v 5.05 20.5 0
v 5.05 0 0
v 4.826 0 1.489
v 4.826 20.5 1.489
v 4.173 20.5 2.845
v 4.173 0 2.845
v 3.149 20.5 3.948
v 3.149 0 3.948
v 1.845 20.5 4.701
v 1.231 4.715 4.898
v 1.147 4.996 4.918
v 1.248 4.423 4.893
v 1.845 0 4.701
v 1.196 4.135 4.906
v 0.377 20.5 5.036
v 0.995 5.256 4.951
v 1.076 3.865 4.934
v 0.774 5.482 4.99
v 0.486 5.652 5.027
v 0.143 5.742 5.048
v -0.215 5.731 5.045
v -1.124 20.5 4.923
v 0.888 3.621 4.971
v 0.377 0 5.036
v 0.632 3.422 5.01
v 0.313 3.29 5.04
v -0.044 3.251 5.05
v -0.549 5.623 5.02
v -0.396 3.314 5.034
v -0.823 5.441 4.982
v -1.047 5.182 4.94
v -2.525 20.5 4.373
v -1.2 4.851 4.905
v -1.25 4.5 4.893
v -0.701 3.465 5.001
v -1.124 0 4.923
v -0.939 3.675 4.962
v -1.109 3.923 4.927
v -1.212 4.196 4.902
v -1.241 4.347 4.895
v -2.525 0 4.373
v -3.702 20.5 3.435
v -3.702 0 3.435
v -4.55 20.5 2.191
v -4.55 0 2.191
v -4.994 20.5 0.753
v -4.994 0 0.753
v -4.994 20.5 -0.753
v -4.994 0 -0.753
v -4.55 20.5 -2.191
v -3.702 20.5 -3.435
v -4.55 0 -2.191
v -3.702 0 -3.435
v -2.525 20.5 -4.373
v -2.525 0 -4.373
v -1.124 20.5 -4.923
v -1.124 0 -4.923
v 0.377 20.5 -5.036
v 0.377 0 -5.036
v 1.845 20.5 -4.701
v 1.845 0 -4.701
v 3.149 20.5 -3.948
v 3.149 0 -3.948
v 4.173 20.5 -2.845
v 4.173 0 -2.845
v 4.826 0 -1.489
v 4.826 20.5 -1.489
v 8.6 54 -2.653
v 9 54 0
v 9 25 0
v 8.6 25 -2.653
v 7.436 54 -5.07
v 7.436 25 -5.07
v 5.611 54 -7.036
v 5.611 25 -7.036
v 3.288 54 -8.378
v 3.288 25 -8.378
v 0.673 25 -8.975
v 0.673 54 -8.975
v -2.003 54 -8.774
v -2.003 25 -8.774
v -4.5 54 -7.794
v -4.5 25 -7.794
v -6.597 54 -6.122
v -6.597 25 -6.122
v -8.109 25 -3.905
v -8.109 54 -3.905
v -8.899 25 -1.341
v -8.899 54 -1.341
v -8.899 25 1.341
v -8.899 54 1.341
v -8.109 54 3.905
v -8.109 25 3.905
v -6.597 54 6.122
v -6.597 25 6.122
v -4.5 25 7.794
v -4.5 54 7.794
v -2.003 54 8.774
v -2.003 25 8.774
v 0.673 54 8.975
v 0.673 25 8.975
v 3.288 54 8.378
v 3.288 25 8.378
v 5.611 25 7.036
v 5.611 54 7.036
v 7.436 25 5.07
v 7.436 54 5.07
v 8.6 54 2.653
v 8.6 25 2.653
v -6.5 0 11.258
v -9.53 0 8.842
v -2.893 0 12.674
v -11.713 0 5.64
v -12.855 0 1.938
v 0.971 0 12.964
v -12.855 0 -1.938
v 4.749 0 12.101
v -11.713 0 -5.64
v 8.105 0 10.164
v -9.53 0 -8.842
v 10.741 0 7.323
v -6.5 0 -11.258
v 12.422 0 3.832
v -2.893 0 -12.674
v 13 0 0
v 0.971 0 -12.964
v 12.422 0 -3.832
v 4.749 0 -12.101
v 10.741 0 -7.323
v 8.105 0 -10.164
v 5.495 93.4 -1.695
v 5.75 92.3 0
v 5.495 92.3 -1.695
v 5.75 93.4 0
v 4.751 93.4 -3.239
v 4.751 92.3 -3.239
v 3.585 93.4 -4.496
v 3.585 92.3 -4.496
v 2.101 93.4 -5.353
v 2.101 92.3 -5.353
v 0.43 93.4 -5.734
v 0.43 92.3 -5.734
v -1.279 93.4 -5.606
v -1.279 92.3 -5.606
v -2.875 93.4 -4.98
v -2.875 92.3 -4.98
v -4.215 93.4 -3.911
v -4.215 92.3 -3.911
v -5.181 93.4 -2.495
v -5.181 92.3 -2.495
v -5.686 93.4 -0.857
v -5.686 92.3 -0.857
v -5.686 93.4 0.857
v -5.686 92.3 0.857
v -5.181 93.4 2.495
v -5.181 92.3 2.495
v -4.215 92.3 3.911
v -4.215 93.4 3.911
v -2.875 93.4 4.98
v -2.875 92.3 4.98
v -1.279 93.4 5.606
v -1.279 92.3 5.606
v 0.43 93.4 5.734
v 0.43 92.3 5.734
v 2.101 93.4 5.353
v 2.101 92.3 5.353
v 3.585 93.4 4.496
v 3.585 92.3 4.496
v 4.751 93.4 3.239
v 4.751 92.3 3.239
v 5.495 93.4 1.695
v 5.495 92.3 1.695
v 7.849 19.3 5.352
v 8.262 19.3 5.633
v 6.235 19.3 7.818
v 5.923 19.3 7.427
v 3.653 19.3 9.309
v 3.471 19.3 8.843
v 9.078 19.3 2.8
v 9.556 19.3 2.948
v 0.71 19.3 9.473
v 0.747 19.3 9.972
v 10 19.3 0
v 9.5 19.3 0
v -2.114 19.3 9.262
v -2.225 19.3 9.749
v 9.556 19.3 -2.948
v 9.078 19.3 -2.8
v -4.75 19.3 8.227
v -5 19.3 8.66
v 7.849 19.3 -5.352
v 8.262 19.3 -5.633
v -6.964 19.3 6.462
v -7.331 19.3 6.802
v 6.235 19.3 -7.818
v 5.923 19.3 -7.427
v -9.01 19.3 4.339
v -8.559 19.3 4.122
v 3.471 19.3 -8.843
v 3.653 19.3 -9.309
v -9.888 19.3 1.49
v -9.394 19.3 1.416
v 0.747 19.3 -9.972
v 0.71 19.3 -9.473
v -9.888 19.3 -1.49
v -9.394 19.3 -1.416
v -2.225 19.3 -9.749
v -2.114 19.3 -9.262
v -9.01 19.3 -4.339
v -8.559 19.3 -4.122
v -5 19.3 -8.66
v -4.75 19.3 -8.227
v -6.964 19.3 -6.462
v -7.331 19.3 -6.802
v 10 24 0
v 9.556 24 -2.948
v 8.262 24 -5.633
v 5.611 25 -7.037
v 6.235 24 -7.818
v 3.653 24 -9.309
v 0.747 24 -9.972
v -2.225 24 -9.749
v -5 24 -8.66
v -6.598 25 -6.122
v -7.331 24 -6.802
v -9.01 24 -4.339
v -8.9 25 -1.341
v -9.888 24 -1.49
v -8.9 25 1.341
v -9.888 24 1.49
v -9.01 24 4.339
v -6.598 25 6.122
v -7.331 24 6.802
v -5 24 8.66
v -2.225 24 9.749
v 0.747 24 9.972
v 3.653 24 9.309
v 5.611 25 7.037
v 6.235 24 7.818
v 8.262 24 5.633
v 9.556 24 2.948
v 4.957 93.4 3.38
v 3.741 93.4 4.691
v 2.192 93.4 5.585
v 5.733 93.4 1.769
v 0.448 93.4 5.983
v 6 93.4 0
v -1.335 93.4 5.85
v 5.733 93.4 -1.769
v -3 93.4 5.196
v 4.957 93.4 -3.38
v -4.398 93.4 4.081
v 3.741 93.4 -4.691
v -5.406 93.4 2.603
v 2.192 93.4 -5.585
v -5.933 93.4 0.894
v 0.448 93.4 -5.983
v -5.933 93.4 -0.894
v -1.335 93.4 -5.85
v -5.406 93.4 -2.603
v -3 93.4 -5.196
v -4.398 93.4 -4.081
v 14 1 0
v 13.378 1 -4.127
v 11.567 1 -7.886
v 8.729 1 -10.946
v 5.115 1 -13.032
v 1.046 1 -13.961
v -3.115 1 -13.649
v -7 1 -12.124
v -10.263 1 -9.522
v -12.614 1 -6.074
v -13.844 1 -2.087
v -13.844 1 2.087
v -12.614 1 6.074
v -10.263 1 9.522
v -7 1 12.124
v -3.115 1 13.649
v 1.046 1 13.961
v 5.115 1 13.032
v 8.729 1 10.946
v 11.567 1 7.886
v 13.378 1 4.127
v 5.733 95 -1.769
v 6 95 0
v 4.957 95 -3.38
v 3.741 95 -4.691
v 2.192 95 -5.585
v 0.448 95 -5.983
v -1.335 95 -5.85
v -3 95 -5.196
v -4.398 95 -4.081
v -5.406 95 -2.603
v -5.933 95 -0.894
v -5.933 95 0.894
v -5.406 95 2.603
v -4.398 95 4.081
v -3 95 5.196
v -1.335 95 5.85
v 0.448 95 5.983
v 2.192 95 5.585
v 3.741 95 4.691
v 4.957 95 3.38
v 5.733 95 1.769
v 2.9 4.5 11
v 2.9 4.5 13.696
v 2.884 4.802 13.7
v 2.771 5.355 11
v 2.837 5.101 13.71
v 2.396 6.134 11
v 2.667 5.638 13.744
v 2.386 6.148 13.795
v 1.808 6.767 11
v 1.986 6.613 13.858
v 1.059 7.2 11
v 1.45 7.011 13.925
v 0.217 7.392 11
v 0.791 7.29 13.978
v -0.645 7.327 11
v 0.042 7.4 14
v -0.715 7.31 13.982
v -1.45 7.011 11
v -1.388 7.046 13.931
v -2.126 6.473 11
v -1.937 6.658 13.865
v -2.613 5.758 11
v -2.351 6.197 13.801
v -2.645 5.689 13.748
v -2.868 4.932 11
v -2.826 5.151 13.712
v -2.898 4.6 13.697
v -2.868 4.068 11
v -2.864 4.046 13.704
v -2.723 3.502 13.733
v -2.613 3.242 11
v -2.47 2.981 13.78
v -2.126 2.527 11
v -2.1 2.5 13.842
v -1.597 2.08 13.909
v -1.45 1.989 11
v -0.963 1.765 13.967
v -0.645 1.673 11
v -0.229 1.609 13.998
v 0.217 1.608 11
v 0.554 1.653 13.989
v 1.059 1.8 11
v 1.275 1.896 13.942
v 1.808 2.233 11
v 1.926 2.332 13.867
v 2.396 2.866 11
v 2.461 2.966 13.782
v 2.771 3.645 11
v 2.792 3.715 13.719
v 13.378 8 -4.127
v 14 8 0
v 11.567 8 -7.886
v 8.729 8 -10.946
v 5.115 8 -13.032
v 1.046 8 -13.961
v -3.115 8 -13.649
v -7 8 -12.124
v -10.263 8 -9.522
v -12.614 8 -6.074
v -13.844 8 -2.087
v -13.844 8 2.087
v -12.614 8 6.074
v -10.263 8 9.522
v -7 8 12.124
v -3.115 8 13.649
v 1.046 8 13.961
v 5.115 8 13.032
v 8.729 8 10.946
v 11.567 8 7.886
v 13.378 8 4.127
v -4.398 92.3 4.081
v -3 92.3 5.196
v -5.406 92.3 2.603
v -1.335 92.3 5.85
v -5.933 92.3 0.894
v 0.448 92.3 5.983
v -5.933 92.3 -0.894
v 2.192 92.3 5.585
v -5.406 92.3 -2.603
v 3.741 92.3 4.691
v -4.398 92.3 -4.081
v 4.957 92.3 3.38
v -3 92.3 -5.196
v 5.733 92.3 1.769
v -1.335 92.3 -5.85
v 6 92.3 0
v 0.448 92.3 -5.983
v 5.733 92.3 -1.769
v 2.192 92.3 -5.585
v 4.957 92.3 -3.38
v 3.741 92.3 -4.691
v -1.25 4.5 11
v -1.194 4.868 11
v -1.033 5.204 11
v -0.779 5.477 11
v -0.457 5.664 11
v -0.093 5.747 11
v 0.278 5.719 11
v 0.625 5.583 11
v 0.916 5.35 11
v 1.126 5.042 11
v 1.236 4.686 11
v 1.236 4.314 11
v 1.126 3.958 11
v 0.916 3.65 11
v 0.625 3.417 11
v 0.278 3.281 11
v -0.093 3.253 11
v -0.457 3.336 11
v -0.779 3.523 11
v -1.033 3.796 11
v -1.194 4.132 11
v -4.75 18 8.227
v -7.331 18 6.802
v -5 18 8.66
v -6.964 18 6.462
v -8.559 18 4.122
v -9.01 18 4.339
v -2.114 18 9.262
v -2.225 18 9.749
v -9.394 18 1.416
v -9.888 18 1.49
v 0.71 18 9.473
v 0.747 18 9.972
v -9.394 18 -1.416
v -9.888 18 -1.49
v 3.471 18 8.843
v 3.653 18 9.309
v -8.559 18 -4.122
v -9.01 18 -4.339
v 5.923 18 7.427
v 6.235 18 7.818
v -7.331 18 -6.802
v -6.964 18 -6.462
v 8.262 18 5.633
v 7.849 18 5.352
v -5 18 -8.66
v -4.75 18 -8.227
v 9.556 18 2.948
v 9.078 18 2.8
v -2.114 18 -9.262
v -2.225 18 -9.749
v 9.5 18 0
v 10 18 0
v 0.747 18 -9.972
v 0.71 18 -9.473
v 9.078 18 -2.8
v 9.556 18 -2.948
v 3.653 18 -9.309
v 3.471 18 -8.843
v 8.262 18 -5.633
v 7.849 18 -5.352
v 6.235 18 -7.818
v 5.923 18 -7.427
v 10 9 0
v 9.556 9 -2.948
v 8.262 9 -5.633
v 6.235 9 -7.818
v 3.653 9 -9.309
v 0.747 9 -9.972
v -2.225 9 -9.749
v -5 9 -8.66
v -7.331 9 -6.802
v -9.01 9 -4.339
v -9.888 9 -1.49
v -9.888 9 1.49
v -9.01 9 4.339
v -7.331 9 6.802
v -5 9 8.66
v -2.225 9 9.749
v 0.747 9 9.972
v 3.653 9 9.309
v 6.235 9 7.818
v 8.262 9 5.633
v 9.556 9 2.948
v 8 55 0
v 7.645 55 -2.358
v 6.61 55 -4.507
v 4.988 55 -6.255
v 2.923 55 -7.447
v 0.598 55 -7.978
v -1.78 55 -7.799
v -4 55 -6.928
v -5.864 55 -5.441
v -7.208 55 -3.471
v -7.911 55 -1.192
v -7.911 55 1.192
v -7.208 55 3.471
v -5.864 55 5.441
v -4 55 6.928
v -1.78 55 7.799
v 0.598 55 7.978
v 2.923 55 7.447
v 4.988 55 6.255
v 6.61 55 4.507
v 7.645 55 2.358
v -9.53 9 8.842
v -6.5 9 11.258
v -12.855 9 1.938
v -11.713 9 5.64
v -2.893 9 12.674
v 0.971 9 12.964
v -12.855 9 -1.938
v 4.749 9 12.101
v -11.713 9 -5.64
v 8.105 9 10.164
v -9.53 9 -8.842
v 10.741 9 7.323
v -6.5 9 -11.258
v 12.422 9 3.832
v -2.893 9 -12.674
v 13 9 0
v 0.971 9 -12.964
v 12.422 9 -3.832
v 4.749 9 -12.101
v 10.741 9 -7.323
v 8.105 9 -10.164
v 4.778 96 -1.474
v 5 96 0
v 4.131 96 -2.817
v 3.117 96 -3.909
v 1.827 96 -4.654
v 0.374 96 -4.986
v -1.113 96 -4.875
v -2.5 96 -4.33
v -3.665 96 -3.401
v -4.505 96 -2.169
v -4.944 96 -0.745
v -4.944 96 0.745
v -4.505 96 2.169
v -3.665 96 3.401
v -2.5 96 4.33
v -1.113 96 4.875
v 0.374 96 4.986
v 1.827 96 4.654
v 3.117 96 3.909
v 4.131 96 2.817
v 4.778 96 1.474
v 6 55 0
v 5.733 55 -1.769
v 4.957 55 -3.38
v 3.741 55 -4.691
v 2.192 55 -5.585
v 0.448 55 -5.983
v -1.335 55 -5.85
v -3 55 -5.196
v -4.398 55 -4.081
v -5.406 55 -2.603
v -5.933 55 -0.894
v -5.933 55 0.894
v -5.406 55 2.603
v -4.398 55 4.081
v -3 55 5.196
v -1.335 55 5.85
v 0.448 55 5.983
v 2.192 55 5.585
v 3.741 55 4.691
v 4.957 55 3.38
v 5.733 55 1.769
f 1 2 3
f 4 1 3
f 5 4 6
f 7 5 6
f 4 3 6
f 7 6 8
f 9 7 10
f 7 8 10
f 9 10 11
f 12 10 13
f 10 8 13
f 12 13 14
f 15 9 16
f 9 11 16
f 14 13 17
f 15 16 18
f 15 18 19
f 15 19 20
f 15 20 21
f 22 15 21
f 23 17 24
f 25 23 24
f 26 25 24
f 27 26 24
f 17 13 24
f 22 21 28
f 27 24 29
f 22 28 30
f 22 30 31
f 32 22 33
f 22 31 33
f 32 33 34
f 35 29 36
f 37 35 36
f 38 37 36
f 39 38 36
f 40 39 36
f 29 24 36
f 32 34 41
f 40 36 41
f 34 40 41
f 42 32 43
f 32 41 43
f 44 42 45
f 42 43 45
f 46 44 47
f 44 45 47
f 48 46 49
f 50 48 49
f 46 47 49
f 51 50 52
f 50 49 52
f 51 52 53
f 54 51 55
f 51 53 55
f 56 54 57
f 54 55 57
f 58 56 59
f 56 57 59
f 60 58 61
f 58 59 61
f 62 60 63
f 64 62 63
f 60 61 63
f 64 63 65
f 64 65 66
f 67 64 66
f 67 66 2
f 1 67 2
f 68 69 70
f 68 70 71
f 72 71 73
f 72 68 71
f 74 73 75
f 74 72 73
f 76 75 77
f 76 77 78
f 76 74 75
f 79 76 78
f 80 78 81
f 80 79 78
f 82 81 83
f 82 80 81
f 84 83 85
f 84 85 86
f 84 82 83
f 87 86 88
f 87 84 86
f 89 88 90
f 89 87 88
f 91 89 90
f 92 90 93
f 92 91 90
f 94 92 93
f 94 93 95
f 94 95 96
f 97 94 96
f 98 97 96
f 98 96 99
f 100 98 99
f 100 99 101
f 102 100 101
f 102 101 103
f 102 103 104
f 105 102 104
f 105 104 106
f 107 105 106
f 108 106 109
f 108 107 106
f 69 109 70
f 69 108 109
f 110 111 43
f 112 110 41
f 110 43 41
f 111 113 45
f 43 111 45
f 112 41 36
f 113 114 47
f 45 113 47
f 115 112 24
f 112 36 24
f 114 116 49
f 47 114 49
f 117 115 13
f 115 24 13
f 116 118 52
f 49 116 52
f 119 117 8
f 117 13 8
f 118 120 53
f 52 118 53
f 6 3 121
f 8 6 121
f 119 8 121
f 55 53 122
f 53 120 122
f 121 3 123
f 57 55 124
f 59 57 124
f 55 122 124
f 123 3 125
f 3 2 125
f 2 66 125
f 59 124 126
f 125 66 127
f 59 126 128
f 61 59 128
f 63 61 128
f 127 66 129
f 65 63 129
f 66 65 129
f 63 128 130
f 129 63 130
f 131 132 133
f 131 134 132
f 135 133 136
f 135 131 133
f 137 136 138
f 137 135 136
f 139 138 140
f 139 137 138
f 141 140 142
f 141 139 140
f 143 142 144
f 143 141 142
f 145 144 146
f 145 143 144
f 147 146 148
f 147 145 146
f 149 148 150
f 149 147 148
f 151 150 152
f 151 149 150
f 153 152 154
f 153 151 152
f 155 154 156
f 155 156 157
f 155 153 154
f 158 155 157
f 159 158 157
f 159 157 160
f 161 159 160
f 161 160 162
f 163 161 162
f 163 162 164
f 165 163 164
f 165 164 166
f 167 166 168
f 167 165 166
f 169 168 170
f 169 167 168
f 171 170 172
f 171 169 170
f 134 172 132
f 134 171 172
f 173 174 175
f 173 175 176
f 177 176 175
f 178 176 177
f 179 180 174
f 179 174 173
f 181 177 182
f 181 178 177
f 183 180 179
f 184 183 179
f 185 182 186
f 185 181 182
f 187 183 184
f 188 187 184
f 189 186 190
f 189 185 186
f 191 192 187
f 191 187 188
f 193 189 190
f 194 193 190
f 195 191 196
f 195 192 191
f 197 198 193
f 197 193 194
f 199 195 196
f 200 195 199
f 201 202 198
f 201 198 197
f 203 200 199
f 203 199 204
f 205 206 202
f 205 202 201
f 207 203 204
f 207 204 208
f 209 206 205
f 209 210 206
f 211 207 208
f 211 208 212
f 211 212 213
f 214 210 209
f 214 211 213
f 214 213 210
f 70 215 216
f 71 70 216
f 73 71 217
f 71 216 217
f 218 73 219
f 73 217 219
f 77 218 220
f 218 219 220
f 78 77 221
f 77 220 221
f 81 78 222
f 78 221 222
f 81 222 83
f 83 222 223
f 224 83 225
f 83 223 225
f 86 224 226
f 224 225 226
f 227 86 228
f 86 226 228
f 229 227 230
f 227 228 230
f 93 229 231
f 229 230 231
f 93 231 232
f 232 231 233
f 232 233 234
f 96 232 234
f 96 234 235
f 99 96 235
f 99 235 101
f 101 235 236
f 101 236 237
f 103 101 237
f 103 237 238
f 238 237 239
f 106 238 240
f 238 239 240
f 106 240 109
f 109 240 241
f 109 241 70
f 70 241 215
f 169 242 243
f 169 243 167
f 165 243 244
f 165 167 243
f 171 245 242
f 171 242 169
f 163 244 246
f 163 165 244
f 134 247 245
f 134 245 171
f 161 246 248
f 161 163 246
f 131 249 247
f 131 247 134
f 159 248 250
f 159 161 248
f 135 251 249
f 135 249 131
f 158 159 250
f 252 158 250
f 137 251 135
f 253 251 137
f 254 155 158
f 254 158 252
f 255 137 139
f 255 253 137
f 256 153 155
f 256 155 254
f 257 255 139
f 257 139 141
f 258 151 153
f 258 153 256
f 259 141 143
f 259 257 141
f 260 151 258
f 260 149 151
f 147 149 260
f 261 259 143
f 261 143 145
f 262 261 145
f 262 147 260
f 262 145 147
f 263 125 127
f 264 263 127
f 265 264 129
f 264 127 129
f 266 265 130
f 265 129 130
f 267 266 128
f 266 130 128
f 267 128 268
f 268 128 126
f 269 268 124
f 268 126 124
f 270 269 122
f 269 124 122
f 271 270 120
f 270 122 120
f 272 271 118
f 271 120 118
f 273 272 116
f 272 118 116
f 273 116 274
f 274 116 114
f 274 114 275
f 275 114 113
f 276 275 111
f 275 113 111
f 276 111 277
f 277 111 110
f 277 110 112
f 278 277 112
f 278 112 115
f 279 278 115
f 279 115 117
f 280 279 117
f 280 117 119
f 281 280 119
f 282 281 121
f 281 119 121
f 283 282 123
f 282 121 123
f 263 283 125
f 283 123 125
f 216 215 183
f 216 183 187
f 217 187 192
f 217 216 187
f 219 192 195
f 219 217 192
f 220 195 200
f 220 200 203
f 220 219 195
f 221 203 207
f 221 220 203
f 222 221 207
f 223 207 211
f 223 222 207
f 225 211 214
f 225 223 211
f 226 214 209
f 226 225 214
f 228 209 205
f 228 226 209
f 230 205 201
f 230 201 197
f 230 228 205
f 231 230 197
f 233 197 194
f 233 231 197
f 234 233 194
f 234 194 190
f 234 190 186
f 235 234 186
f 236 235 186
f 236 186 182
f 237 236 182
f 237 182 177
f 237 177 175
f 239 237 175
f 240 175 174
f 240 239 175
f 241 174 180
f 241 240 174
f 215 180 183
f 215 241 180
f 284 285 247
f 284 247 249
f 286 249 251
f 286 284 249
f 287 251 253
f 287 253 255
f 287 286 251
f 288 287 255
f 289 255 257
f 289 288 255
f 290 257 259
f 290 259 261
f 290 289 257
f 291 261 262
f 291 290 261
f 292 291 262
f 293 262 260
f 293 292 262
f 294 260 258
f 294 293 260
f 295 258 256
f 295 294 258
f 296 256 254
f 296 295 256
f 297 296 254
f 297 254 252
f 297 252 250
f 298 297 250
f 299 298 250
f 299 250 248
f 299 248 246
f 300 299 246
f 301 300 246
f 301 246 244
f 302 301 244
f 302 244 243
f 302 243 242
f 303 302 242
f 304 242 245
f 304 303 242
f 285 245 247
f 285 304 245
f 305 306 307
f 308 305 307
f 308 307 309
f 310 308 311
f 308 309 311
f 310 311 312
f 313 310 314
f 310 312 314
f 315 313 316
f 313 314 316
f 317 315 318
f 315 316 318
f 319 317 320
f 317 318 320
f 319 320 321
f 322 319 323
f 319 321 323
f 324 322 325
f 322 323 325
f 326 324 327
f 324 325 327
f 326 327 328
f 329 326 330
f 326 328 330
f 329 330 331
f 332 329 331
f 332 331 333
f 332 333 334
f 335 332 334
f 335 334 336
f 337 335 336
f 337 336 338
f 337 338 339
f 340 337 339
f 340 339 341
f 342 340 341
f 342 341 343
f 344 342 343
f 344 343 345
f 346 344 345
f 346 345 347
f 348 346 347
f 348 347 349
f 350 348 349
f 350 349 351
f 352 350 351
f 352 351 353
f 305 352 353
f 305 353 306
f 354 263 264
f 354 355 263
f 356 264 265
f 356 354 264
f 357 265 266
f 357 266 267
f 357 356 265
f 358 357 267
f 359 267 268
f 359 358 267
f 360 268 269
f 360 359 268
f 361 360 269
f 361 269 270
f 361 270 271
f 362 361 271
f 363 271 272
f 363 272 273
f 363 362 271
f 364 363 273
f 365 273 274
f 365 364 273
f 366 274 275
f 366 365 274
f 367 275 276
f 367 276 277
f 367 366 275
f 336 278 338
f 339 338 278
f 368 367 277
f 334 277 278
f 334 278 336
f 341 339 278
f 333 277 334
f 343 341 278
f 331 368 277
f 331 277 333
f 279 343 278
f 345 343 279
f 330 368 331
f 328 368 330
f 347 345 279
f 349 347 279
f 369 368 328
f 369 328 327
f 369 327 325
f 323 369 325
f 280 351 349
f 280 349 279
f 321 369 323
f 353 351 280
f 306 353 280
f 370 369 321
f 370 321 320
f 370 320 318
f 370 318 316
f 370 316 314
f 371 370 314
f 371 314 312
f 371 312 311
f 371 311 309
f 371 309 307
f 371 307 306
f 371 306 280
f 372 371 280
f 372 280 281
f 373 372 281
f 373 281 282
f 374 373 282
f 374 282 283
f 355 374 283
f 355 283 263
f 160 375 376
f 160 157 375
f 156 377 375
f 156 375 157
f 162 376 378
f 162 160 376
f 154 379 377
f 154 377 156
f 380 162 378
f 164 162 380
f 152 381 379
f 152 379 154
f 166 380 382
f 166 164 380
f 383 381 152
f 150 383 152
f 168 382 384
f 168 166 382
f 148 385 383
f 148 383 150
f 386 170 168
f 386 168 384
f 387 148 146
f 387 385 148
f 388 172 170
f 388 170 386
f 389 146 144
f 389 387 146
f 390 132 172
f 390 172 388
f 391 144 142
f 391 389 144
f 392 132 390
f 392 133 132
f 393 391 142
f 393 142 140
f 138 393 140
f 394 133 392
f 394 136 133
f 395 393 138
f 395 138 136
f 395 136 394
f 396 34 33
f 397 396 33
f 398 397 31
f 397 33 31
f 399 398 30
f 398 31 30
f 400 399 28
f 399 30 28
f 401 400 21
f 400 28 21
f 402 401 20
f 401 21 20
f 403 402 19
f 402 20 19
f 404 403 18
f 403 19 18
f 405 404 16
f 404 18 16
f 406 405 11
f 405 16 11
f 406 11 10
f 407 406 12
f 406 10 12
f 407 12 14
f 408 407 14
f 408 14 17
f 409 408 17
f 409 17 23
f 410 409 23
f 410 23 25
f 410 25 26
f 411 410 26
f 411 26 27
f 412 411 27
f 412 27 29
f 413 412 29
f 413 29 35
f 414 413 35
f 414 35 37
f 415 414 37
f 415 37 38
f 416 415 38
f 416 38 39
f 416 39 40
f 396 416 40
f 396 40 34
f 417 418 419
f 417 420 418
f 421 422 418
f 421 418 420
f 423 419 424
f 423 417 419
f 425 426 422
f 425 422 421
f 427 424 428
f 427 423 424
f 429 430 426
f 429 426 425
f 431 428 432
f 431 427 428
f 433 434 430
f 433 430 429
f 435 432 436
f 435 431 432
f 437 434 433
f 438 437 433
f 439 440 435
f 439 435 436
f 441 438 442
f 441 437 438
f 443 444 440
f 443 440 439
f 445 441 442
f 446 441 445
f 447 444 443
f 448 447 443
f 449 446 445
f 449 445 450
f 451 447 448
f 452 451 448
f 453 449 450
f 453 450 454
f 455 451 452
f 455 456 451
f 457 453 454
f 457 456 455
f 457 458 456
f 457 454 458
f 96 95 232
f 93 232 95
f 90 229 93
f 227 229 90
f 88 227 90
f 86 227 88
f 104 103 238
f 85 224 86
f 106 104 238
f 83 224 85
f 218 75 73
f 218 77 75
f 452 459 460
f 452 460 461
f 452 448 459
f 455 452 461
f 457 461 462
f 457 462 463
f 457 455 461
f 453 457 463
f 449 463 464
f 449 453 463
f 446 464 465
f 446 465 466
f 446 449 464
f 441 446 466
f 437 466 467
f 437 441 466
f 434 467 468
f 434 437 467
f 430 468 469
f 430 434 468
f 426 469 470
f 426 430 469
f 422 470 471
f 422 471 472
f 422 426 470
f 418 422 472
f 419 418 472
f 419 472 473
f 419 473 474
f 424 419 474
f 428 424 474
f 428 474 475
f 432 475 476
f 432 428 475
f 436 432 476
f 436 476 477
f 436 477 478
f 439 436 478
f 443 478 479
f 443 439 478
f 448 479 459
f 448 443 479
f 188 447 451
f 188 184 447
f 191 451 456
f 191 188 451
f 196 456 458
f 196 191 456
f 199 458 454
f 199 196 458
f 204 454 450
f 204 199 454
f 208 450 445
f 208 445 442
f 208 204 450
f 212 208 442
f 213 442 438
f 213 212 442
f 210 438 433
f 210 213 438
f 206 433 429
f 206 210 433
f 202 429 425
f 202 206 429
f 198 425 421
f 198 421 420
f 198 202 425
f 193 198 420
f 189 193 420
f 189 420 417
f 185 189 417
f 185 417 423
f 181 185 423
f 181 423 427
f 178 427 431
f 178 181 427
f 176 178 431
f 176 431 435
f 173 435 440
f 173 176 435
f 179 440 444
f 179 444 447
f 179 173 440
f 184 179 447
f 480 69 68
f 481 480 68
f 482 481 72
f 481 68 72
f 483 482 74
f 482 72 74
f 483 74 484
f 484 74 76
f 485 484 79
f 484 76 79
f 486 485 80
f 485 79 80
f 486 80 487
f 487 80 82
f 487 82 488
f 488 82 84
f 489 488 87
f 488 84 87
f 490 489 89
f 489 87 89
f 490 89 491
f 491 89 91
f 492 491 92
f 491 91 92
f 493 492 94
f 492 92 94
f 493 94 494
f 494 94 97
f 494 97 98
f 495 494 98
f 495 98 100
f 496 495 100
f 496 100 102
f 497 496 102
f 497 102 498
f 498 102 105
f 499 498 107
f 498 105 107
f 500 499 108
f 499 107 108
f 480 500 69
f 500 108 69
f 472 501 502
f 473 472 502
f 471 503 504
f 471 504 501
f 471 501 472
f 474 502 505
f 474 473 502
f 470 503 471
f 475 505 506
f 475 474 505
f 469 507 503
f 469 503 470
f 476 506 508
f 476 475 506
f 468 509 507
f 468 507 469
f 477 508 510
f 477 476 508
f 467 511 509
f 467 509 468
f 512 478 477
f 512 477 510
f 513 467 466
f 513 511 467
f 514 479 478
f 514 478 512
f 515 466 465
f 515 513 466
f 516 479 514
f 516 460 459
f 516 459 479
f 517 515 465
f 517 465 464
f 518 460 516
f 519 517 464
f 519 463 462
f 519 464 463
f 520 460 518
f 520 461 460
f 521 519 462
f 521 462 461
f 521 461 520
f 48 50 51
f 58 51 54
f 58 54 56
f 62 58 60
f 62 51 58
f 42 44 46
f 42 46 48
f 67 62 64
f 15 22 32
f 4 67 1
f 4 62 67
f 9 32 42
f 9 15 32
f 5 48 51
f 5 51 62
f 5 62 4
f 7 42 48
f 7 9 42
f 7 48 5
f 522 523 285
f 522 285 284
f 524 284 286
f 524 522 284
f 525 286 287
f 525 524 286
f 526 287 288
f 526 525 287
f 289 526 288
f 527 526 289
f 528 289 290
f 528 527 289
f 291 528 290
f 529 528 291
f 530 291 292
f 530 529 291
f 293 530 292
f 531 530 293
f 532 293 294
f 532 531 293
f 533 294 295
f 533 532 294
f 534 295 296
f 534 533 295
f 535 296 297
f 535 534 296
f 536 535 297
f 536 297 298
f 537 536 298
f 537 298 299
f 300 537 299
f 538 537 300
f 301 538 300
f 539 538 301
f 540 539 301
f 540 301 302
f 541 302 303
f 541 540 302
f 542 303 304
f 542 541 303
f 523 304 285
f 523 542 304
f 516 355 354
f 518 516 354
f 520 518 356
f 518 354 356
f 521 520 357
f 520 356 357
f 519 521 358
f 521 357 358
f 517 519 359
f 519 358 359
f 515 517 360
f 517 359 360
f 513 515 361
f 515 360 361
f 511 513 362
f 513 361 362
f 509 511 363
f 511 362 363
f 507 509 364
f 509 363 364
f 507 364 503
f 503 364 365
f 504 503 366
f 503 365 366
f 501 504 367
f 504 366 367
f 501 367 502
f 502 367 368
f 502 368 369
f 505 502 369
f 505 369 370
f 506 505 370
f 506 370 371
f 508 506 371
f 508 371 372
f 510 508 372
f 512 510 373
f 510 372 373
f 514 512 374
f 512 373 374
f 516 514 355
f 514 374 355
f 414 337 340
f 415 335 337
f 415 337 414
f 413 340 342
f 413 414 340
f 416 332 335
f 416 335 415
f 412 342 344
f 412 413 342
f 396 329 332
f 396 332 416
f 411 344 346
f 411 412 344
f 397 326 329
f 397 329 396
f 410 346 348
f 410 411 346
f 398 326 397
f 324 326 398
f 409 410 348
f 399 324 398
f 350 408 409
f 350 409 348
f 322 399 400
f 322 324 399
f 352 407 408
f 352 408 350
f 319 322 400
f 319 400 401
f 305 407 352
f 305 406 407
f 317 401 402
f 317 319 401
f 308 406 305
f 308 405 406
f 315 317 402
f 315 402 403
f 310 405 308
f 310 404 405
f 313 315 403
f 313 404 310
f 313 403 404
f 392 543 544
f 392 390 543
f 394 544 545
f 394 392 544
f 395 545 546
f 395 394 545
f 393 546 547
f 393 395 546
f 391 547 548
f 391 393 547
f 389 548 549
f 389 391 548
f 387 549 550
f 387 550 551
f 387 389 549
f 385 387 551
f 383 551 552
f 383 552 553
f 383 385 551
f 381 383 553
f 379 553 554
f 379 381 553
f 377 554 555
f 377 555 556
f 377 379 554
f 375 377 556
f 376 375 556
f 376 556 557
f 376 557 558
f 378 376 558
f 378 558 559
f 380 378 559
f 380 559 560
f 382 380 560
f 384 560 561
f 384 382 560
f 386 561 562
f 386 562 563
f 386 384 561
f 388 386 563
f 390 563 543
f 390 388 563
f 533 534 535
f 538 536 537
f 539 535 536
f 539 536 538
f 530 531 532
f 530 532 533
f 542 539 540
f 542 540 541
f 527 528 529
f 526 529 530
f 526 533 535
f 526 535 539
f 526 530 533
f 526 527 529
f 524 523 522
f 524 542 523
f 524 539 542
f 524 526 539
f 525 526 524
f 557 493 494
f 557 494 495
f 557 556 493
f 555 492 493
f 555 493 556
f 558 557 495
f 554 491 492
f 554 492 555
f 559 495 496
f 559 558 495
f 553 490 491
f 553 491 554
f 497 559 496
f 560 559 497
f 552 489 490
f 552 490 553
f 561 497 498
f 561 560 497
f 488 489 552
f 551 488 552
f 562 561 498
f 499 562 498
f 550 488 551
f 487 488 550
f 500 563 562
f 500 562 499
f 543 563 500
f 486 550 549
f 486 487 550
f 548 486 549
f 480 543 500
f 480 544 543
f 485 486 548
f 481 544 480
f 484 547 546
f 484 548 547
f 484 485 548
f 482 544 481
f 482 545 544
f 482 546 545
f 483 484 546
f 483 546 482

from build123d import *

# Parameters (mm, degrees)
CHAMFER2_SIZE               = 1
CHAMFER7_SIZE               = 1
CHAMFER8_SIZE               = 1
CHAMFER9_SIZE               = 1
SKETCH2_R                   = 5.05
CUT_EXTRUDE1_DEPTH          = 20.5
SKETCH3_R                   = 2.9
CUT_EXTRUDE2_DEPTH          = 3
TAP_DRILL_FOR_M3_TAP1_D     = 2.5
TAP_DRILL_FOR_M3_TAP1_DEPTH = 8
TAP_DRILL_FOR_M3_TAP1_TIP   = 0.751075774


with BuildPart() as part:
    # Sketch1 → Revolve1 (revolve)
    with BuildSketch(Plane.XY, mode=Mode.PRIVATE) as revolve1_sk:
        Polygon((0, 0), (-10, 0), (-14, 0), (-14, 9), (-10, 9), (-10, 18), (-9.5, 18), (-9.5, 19.3), (-10, 19.3), (-10, 25), (-9, 25), (-9, 55), (-6, 55), (-6, 92.3), (-5.75, 92.3), (-5.75, 93.4), (-6, 93.4), (-6, 96), (0, 96), align=None)
    revolve(revolve1_sk.sketch.rotate(Axis((0, 0, 0), (0, 1, 0)), 180), axis=Axis((0, 0, 0), (0, 1, 0)))

    # Chamfer2
    chamfer2_edges = [part.edges().sort_by_distance(p)[0] for p in [
        (-6, 96, 0),
    ]]
    chamfer(chamfer2_edges, length=CHAMFER2_SIZE)

    # Chamfer7
    chamfer7_edges = [part.edges().sort_by_distance(p)[0] for p in [
        (-9, 55, 0),
    ]]
    chamfer(chamfer7_edges, length=CHAMFER7_SIZE)

    # Chamfer8
    chamfer8_edges = [part.edges().sort_by_distance(p)[0] for p in [
        (-10, 25, 0),
    ]]
    chamfer(chamfer8_edges, length=CHAMFER8_SIZE - 0.0001)  # a hair under: the kernel refuses the full size

    # Chamfer9
    chamfer9_edges = [part.edges().sort_by_distance(p)[0] for p in [
        (-14, 9, 0),
        (-14, 0, 0),
    ]]
    chamfer(chamfer9_edges, length=CHAMFER9_SIZE)

    # Sketch2 → Cut-Extrude1 (cut)
    with BuildSketch(Plane.XZ):
        Circle(SKETCH2_R)
    extrude(amount=-CUT_EXTRUDE1_DEPTH, mode=Mode.SUBTRACT)

    # Sketch3 → Cut-Extrude2 (cut)
    with BuildSketch(Plane.XY.offset(14)):
        with Locations((0, 4.5)):
            Circle(SKETCH3_R)
    extrude(amount=-CUT_EXTRUDE2_DEPTH, mode=Mode.SUBTRACT)

    # Tap Drill for M3 Tap1
    with Locations(Plane(origin=(0, 4.5, 11), x_dir=(1, 0, 0), z_dir=(0, 0, 1))):
        with Locations((0, 0)):
            Hole(TAP_DRILL_FOR_M3_TAP1_D / 2, depth=TAP_DRILL_FOR_M3_TAP1_DEPTH)
            with Locations((0, 0, -(TAP_DRILL_FOR_M3_TAP1_DEPTH + TAP_DRILL_FOR_M3_TAP1_TIP / 2))):  # 118° drill point
                Cone(0, TAP_DRILL_FOR_M3_TAP1_D / 2, TAP_DRILL_FOR_M3_TAP1_TIP, mode=Mode.SUBTRACT)


solid = part.part
